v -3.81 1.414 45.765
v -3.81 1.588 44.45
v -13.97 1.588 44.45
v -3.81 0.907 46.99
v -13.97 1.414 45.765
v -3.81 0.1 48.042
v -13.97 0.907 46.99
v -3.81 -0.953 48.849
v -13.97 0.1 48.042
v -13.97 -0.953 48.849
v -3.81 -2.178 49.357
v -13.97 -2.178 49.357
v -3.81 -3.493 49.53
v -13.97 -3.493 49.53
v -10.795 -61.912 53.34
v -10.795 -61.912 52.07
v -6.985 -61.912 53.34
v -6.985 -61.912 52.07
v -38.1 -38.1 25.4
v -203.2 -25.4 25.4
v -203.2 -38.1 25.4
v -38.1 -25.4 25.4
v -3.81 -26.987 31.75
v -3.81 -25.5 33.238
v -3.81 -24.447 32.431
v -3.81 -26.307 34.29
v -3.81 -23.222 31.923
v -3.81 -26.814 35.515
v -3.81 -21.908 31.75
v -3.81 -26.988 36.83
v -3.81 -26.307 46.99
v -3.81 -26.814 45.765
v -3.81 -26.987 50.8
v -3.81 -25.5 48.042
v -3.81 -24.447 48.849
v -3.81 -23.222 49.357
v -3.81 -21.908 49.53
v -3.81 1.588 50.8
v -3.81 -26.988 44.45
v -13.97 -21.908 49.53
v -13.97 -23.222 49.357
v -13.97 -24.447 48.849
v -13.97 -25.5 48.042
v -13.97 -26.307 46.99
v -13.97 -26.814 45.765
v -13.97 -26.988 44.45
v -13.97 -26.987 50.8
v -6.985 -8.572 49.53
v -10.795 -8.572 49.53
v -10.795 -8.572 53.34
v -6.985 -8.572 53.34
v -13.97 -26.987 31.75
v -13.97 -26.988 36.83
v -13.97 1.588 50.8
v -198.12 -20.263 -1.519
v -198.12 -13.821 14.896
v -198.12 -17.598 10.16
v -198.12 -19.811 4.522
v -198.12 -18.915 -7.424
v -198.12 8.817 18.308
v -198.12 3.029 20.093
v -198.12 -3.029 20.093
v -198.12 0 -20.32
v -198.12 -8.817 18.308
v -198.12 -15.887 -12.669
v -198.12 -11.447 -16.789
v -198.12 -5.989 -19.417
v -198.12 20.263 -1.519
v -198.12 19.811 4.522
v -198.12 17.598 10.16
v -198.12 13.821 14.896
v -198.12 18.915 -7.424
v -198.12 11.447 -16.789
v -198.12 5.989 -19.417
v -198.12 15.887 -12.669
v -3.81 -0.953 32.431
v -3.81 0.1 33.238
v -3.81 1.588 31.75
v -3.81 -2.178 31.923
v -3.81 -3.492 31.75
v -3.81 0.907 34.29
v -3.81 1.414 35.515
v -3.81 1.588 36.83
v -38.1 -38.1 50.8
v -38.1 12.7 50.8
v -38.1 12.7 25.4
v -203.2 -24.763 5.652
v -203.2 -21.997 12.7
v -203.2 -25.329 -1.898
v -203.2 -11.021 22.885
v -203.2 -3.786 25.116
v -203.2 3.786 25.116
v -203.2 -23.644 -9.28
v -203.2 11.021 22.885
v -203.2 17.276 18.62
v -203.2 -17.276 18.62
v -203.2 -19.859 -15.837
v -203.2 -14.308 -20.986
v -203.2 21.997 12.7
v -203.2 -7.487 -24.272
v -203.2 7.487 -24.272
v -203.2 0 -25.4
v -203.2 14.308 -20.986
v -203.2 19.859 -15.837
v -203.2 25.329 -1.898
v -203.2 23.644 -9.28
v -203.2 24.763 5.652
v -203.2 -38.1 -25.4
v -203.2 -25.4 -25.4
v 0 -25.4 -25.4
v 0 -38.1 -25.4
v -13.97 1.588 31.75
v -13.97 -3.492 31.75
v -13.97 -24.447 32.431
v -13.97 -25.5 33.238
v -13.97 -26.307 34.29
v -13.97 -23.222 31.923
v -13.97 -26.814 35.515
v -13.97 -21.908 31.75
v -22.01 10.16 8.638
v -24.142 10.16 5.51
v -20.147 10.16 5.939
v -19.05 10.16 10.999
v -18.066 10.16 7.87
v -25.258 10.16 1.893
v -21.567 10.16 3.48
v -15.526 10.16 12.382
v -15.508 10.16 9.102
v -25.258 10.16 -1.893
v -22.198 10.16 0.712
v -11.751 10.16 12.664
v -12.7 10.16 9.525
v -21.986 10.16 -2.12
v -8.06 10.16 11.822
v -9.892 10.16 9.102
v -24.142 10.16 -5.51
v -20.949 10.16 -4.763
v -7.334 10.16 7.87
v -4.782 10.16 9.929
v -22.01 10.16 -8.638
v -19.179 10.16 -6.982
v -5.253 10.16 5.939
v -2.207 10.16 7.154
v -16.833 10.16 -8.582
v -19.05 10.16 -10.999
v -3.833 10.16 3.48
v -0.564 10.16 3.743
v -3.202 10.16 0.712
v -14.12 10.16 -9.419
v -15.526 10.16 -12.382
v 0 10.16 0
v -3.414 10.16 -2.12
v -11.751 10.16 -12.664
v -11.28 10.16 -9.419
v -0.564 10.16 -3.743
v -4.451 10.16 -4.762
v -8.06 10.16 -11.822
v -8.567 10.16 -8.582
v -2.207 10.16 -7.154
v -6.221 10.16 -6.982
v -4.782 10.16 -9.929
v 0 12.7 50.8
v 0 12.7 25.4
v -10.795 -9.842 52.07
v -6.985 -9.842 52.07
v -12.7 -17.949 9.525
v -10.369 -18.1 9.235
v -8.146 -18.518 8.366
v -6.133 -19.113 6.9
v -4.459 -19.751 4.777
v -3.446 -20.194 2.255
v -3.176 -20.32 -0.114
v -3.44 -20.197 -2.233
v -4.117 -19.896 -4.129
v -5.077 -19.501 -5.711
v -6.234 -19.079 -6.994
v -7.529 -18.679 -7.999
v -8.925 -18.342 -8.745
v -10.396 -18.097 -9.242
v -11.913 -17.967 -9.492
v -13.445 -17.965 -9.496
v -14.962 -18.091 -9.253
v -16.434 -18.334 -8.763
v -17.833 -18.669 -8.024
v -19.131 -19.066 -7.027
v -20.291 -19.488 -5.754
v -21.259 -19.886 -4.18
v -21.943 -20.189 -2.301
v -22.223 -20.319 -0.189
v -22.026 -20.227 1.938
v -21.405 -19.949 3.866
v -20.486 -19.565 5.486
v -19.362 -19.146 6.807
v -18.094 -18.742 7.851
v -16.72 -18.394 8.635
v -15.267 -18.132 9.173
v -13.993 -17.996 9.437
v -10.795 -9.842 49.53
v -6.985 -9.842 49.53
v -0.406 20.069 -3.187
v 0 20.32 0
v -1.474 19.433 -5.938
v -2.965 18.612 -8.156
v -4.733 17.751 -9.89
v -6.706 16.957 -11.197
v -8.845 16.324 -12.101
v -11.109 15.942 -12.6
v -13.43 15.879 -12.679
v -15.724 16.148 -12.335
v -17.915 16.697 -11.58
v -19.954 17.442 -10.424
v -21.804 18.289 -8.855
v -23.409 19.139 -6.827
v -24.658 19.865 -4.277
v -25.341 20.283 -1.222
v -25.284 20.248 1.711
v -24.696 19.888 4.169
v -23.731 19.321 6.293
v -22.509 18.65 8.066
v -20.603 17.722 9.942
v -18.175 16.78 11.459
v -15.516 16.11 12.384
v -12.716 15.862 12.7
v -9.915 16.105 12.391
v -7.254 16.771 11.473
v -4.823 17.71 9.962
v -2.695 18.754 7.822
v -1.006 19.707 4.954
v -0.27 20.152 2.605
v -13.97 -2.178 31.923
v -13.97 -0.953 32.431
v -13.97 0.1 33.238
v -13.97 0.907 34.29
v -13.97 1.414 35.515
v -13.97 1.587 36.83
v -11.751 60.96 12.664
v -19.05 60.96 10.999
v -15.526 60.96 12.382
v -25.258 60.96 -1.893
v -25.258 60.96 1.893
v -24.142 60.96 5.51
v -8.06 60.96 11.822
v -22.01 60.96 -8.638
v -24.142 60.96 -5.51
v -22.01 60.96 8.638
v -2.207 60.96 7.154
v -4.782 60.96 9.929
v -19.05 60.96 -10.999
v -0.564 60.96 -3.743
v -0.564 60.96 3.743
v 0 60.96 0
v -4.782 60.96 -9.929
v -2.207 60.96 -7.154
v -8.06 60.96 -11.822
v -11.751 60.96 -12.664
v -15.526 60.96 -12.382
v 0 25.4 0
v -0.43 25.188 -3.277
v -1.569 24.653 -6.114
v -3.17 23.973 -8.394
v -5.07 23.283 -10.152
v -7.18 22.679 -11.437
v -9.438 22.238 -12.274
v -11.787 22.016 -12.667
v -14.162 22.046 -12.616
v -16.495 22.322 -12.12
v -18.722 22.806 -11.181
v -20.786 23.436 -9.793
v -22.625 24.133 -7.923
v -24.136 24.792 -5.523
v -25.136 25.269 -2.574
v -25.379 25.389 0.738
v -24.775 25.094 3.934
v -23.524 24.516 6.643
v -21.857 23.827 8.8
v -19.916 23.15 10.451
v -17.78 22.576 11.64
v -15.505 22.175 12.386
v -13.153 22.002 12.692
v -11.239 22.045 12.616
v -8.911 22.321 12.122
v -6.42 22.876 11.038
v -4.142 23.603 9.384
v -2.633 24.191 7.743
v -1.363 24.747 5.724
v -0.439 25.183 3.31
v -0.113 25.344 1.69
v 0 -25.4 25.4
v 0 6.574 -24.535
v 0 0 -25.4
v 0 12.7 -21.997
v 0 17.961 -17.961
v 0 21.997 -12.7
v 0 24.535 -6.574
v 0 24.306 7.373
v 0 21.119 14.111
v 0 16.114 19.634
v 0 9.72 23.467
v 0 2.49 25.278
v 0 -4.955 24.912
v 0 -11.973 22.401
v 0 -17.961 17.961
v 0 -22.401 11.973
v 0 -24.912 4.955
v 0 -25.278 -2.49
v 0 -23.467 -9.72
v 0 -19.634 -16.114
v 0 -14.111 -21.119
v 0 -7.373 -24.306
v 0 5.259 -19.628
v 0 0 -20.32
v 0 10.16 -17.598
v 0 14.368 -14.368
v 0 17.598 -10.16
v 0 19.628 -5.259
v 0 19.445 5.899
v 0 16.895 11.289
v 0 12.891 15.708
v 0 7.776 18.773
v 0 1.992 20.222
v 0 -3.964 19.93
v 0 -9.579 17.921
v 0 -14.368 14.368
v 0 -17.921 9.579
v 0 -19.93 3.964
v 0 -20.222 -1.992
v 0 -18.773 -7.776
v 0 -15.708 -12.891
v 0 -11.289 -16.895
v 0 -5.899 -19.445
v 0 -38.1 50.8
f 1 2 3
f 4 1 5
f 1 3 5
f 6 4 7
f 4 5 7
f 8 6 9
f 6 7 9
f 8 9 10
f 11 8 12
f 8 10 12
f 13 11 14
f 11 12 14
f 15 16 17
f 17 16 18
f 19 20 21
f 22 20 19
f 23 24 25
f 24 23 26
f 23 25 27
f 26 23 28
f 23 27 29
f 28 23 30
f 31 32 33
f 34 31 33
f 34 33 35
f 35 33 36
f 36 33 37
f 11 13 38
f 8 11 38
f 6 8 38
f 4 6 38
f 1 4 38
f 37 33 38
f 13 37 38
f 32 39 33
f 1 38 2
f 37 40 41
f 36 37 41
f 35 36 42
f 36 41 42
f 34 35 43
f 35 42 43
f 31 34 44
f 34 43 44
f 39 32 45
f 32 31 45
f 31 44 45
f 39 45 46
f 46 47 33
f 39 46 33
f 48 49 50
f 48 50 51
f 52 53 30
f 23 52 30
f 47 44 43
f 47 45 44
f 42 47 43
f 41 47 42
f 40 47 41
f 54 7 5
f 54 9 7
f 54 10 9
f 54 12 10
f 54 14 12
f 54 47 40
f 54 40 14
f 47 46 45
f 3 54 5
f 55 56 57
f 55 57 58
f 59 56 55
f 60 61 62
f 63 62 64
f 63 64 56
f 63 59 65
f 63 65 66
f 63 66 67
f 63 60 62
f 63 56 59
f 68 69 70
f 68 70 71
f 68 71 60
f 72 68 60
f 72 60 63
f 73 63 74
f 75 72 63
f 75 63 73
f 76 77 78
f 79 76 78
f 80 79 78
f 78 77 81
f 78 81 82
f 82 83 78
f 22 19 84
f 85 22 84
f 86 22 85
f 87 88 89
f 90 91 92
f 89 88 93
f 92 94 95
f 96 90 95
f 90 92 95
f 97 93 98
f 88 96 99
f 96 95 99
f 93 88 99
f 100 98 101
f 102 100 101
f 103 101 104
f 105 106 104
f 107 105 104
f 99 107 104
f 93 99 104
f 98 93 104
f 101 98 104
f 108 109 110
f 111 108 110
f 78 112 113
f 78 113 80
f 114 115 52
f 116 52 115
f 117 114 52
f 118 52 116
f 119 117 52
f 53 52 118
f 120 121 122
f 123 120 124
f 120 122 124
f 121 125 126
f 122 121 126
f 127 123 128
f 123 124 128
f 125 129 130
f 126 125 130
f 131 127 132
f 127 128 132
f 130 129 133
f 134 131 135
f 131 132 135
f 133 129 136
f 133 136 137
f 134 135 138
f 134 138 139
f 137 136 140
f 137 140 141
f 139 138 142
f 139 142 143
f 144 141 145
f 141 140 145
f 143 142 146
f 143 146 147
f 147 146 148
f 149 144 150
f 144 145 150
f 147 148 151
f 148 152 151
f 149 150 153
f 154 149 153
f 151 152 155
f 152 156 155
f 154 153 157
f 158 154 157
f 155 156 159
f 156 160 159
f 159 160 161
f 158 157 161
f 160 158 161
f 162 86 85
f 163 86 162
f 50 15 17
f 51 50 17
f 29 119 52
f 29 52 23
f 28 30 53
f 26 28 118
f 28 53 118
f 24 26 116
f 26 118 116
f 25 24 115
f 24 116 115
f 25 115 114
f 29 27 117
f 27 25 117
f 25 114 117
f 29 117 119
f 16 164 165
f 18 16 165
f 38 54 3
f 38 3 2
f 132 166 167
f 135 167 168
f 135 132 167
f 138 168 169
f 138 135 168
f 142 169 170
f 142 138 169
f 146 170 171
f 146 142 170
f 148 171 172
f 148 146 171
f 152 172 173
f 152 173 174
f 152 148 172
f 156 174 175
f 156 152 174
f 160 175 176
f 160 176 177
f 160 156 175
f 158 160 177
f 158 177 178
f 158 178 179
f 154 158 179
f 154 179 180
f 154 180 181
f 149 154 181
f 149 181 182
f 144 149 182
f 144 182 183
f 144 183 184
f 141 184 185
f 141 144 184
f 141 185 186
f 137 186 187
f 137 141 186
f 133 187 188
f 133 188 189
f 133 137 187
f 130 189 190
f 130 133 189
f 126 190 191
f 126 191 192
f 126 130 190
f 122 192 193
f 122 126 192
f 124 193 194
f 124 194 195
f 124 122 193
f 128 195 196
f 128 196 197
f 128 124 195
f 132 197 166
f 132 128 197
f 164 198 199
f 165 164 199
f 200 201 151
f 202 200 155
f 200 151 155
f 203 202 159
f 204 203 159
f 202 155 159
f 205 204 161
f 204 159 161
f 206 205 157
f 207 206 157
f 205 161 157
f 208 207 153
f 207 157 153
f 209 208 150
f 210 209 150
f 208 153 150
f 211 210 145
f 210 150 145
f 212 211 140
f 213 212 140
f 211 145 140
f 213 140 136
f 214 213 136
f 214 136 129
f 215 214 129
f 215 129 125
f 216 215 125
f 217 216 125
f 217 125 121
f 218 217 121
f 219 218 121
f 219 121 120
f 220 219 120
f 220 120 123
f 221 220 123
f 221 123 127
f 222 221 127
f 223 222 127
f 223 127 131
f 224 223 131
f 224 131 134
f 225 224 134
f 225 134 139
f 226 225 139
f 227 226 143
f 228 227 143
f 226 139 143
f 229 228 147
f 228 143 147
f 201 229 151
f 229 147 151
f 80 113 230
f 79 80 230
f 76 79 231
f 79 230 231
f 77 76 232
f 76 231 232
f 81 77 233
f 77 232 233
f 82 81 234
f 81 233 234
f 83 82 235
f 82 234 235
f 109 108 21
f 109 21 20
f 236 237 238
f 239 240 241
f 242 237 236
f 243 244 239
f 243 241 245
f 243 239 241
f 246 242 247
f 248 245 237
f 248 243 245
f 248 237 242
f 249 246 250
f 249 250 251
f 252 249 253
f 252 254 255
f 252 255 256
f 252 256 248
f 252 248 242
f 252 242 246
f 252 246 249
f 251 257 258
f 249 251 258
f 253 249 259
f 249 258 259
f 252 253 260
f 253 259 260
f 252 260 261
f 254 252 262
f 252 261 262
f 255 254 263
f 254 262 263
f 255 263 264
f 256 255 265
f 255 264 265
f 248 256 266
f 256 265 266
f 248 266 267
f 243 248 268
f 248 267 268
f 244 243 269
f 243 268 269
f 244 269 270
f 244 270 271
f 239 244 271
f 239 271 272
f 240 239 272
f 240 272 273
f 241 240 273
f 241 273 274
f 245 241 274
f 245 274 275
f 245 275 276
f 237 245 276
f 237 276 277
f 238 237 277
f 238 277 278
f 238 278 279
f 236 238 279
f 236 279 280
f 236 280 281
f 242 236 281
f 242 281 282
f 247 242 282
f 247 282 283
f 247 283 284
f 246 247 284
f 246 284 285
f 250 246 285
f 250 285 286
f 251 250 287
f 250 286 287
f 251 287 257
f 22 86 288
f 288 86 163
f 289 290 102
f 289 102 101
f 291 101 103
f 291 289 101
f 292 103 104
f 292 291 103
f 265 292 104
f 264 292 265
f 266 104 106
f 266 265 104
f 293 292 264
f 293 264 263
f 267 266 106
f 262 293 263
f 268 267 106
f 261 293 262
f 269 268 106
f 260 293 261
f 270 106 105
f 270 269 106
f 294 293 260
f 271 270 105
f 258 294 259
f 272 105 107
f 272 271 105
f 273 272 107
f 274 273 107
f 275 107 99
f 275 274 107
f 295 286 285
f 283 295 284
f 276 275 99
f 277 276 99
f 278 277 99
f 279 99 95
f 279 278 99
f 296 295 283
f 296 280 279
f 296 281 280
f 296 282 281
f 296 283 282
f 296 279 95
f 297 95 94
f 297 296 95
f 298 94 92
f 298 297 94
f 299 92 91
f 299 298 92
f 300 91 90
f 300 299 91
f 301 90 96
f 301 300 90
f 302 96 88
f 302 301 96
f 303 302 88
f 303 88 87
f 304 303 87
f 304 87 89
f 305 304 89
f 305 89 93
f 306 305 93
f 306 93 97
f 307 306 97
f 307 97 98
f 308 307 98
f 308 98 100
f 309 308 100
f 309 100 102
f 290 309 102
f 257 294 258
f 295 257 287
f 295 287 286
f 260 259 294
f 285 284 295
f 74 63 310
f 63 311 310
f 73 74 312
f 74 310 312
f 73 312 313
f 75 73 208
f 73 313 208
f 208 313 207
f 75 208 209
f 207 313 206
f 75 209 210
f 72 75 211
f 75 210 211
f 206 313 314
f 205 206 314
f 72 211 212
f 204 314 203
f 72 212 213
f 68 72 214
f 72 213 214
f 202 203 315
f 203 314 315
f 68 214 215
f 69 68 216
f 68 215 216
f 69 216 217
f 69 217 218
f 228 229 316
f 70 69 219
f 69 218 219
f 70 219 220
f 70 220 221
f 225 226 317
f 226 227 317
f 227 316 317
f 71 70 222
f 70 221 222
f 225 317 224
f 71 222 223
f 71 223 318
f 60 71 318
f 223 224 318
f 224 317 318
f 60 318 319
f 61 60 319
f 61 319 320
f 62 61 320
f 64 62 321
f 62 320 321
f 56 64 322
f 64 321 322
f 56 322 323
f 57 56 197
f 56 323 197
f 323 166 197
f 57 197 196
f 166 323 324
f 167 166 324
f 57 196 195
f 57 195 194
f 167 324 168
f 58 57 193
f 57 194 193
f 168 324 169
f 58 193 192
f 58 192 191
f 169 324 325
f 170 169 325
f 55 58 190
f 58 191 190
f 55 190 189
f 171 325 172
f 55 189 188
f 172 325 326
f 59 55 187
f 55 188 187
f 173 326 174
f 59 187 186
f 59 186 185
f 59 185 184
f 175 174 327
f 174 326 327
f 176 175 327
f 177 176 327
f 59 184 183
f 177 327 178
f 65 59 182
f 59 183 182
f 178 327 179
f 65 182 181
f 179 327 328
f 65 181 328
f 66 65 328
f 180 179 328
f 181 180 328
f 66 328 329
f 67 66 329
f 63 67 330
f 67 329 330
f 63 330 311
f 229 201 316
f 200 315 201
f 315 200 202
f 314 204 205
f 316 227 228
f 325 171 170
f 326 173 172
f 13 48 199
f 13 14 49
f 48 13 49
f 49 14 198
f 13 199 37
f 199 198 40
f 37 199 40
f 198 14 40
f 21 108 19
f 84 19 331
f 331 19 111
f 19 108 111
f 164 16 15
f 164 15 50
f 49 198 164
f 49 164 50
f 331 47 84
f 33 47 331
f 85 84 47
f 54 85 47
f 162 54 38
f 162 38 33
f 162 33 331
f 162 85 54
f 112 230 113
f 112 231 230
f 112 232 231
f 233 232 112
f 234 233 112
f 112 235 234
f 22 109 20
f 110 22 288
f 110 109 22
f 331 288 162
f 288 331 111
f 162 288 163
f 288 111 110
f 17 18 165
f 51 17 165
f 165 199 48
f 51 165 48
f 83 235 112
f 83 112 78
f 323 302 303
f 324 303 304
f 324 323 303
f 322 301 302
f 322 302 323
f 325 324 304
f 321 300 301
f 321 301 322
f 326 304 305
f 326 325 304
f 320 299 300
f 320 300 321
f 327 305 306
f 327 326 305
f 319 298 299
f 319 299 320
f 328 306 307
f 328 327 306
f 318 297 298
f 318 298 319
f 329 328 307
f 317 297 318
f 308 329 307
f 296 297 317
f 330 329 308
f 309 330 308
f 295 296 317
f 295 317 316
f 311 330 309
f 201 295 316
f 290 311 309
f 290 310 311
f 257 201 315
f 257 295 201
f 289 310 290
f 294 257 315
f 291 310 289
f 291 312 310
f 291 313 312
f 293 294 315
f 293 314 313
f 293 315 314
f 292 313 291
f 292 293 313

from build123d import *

# Parameters (mm, degrees)
SKETCH3_R                       = 25.4
BOSS_EXTRUDE1_DEPTH             = 203.2
SHELL1_T                        = -5.08
BOSS_EXTRUDE2_DEPTH             = 25.4
BOSS_EXTRUDE2_DEPTH_BACK        = 25.4
SKETCH4_W                       = 203.2
SKETCH4_H                       = 12.7
SKETCH5_W                       = 38.1
SKETCH5_H                       = 50.8
BOSS_EXTRUDE3_DEPTH             = 25.4
SKETCH6_W                       = 10.16
SKETCH6_H                       = 28.575
CUT_EXTRUDE1_DEPTH              = 19.05
BOSS_EXTRUDE4_REACH             = 201.6
SKETCH8_W                       = 3.81
SKETCH8_H                       = 1.27
BOSS_EXTRUDE5_DEPTH             = 2.54
SKETCH10_W                      = 3.81
SKETCH10_H                      = 53.34
BOSS_EXTRUDE6_DEPTH             = 1.27
SKETCH11_R                      = 9.525
BOSS_EXTRUDE7_DEPTH             = 10.16
BOSS_EXTRUDE7_DIRECTION_2_REACH = 221.017
SKETCH12_R                      = 12.7
BOSS_EXTRUDE8_DEPTH             = 50.8


with BuildPart() as part:
    # Sketch3 → Boss-Extrude1 (new body)
    with BuildSketch(Plane(origin=(0, 0, 0), x_dir=(0, 0, -1), z_dir=(1, 0, 0))):
        Circle(SKETCH3_R)
    extrude(amount=-BOSS_EXTRUDE1_DEPTH)

    # Shell1
    shell1_openings = [part.faces().sort_by_distance(p)[0] for p in [
        (0, 0, 0),
    ]]
    offset(amount=SHELL1_T, openings=shell1_openings, kind=Kind.INTERSECTION)

    # Sketch11 → Boss-Extrude7 (add)
    with BuildSketch(Plane(origin=(0, 0, 0), x_dir=(1, 0, 0), z_dir=(0, 1, 0))):
        with Locations((-12.7, 0)):
            Circle(SKETCH11_R)
    extrude(amount=BOSS_EXTRUDE7_DEPTH)

    # Sketch11 → Boss-Extrude7 direction 2 (add, up to next)
    with BuildSketch(Plane(origin=(0, 0, 0), x_dir=(1, 0, 0), z_dir=(0, 1, 0)), mode=Mode.PRIVATE) as boss_extrude7_direction_2_sk1:
        with Locations((-12.7, 0)):
            Circle(SKETCH11_R)
    boss_extrude7_direction_2_tool1 = extrude(boss_extrude7_direction_2_sk1.sketch, amount=-BOSS_EXTRUDE7_DIRECTION_2_REACH, mode=Mode.PRIVATE) - part.part
    add(boss_extrude7_direction_2_tool1.solids().sort_by_distance((-12.7, 0, 0))[0])

    # Sketch12 → Boss-Extrude8 (add)
    with BuildSketch(Plane(origin=(0, 10.16, 0), x_dir=(1, 0, 0), z_dir=(0, 1, 0))):
        with Locations((-12.7, 0)):
            Circle(SKETCH12_R)
    extrude(amount=BOSS_EXTRUDE8_DEPTH)


with BuildPart() as body_2:
    # Sketch4 → Boss-Extrude2 (new, two sides: drawn at the far end of the back side and taken through both)
    with BuildSketch(Plane.XY.offset(-BOSS_EXTRUDE2_DEPTH_BACK)):
        with Locations((-101.6, -31.75)):
            Rectangle(SKETCH4_W, SKETCH4_H)
    extrude(amount=BOSS_EXTRUDE2_DEPTH + BOSS_EXTRUDE2_DEPTH_BACK)

    # Sketch5 → Boss-Extrude3 (add)
    with BuildSketch(Plane.XY.offset(25.4)):
        with Locations((-19.05, -12.7)):
            Rectangle(SKETCH5_W, SKETCH5_H)
    extrude(amount=BOSS_EXTRUDE3_DEPTH)

    # Sketch6 → Cut-Extrude1 (cut)
    with BuildSketch(Plane.XY.offset(50.8)):
        with Locations((-8.89, -12.7)):
            Rectangle(SKETCH6_W, SKETCH6_H)
    extrude(amount=-CUT_EXTRUDE1_DEPTH, mode=Mode.SUBTRACT)

    # Sketch7 → Boss-Extrude4 (add, up to next)
    with BuildSketch(Plane(origin=(-13.97, 0, 0), x_dir=(0, 0, -1), z_dir=(1, 0, 0)), mode=Mode.PRIVATE) as boss_extrude4_sk1:
        with BuildLine():
            Line((-44.45, -26.9875), (-36.83, -26.9875))
            ThreePointArc((-36.83, -26.9875), (-33.237897552, -25.499602448), (-31.75, -21.9075))
            Line((-31.75, -21.9075), (-31.75, -3.4925))
            ThreePointArc((-31.75, -3.4925), (-33.237897552, 0.099602448), (-36.83, 1.5875))
            Line((-36.83, 1.5875), (-44.45, 1.5875))
            ThreePointArc((-44.45, 1.5875), (-48.042102448, 0.099602448), (-49.53, -3.4925))
            Line((-49.53, -3.4925), (-49.53, -21.9075))
            ThreePointArc((-49.53, -21.9075), (-48.042102448, -25.499602448), (-44.45, -26.9875))
        make_face()
    boss_extrude4_tool1 = extrude(boss_extrude4_sk1.sketch, amount=BOSS_EXTRUDE4_REACH, mode=Mode.PRIVATE) - body_2.part
    add(boss_extrude4_tool1.solids().sort_by_distance((-13.97, -12.7, 40.64))[0])

    # Sketch8 → Boss-Extrude5 (add)
    with BuildSketch(Plane.XY.offset(49.53)):
        with Locations((-8.89, -9.2075)):
            Rectangle(SKETCH8_W, SKETCH8_H)
    extrude(amount=BOSS_EXTRUDE5_DEPTH)

    # Sketch10 → Boss-Extrude6 (add)
    with BuildSketch(Plane.XY.offset(52.07)):
        with Locations((-8.89, -35.2425)):
            Rectangle(SKETCH10_W, SKETCH10_H)
    extrude(amount=BOSS_EXTRUDE6_DEPTH)


solid = Compound([part.part, body_2.part])
